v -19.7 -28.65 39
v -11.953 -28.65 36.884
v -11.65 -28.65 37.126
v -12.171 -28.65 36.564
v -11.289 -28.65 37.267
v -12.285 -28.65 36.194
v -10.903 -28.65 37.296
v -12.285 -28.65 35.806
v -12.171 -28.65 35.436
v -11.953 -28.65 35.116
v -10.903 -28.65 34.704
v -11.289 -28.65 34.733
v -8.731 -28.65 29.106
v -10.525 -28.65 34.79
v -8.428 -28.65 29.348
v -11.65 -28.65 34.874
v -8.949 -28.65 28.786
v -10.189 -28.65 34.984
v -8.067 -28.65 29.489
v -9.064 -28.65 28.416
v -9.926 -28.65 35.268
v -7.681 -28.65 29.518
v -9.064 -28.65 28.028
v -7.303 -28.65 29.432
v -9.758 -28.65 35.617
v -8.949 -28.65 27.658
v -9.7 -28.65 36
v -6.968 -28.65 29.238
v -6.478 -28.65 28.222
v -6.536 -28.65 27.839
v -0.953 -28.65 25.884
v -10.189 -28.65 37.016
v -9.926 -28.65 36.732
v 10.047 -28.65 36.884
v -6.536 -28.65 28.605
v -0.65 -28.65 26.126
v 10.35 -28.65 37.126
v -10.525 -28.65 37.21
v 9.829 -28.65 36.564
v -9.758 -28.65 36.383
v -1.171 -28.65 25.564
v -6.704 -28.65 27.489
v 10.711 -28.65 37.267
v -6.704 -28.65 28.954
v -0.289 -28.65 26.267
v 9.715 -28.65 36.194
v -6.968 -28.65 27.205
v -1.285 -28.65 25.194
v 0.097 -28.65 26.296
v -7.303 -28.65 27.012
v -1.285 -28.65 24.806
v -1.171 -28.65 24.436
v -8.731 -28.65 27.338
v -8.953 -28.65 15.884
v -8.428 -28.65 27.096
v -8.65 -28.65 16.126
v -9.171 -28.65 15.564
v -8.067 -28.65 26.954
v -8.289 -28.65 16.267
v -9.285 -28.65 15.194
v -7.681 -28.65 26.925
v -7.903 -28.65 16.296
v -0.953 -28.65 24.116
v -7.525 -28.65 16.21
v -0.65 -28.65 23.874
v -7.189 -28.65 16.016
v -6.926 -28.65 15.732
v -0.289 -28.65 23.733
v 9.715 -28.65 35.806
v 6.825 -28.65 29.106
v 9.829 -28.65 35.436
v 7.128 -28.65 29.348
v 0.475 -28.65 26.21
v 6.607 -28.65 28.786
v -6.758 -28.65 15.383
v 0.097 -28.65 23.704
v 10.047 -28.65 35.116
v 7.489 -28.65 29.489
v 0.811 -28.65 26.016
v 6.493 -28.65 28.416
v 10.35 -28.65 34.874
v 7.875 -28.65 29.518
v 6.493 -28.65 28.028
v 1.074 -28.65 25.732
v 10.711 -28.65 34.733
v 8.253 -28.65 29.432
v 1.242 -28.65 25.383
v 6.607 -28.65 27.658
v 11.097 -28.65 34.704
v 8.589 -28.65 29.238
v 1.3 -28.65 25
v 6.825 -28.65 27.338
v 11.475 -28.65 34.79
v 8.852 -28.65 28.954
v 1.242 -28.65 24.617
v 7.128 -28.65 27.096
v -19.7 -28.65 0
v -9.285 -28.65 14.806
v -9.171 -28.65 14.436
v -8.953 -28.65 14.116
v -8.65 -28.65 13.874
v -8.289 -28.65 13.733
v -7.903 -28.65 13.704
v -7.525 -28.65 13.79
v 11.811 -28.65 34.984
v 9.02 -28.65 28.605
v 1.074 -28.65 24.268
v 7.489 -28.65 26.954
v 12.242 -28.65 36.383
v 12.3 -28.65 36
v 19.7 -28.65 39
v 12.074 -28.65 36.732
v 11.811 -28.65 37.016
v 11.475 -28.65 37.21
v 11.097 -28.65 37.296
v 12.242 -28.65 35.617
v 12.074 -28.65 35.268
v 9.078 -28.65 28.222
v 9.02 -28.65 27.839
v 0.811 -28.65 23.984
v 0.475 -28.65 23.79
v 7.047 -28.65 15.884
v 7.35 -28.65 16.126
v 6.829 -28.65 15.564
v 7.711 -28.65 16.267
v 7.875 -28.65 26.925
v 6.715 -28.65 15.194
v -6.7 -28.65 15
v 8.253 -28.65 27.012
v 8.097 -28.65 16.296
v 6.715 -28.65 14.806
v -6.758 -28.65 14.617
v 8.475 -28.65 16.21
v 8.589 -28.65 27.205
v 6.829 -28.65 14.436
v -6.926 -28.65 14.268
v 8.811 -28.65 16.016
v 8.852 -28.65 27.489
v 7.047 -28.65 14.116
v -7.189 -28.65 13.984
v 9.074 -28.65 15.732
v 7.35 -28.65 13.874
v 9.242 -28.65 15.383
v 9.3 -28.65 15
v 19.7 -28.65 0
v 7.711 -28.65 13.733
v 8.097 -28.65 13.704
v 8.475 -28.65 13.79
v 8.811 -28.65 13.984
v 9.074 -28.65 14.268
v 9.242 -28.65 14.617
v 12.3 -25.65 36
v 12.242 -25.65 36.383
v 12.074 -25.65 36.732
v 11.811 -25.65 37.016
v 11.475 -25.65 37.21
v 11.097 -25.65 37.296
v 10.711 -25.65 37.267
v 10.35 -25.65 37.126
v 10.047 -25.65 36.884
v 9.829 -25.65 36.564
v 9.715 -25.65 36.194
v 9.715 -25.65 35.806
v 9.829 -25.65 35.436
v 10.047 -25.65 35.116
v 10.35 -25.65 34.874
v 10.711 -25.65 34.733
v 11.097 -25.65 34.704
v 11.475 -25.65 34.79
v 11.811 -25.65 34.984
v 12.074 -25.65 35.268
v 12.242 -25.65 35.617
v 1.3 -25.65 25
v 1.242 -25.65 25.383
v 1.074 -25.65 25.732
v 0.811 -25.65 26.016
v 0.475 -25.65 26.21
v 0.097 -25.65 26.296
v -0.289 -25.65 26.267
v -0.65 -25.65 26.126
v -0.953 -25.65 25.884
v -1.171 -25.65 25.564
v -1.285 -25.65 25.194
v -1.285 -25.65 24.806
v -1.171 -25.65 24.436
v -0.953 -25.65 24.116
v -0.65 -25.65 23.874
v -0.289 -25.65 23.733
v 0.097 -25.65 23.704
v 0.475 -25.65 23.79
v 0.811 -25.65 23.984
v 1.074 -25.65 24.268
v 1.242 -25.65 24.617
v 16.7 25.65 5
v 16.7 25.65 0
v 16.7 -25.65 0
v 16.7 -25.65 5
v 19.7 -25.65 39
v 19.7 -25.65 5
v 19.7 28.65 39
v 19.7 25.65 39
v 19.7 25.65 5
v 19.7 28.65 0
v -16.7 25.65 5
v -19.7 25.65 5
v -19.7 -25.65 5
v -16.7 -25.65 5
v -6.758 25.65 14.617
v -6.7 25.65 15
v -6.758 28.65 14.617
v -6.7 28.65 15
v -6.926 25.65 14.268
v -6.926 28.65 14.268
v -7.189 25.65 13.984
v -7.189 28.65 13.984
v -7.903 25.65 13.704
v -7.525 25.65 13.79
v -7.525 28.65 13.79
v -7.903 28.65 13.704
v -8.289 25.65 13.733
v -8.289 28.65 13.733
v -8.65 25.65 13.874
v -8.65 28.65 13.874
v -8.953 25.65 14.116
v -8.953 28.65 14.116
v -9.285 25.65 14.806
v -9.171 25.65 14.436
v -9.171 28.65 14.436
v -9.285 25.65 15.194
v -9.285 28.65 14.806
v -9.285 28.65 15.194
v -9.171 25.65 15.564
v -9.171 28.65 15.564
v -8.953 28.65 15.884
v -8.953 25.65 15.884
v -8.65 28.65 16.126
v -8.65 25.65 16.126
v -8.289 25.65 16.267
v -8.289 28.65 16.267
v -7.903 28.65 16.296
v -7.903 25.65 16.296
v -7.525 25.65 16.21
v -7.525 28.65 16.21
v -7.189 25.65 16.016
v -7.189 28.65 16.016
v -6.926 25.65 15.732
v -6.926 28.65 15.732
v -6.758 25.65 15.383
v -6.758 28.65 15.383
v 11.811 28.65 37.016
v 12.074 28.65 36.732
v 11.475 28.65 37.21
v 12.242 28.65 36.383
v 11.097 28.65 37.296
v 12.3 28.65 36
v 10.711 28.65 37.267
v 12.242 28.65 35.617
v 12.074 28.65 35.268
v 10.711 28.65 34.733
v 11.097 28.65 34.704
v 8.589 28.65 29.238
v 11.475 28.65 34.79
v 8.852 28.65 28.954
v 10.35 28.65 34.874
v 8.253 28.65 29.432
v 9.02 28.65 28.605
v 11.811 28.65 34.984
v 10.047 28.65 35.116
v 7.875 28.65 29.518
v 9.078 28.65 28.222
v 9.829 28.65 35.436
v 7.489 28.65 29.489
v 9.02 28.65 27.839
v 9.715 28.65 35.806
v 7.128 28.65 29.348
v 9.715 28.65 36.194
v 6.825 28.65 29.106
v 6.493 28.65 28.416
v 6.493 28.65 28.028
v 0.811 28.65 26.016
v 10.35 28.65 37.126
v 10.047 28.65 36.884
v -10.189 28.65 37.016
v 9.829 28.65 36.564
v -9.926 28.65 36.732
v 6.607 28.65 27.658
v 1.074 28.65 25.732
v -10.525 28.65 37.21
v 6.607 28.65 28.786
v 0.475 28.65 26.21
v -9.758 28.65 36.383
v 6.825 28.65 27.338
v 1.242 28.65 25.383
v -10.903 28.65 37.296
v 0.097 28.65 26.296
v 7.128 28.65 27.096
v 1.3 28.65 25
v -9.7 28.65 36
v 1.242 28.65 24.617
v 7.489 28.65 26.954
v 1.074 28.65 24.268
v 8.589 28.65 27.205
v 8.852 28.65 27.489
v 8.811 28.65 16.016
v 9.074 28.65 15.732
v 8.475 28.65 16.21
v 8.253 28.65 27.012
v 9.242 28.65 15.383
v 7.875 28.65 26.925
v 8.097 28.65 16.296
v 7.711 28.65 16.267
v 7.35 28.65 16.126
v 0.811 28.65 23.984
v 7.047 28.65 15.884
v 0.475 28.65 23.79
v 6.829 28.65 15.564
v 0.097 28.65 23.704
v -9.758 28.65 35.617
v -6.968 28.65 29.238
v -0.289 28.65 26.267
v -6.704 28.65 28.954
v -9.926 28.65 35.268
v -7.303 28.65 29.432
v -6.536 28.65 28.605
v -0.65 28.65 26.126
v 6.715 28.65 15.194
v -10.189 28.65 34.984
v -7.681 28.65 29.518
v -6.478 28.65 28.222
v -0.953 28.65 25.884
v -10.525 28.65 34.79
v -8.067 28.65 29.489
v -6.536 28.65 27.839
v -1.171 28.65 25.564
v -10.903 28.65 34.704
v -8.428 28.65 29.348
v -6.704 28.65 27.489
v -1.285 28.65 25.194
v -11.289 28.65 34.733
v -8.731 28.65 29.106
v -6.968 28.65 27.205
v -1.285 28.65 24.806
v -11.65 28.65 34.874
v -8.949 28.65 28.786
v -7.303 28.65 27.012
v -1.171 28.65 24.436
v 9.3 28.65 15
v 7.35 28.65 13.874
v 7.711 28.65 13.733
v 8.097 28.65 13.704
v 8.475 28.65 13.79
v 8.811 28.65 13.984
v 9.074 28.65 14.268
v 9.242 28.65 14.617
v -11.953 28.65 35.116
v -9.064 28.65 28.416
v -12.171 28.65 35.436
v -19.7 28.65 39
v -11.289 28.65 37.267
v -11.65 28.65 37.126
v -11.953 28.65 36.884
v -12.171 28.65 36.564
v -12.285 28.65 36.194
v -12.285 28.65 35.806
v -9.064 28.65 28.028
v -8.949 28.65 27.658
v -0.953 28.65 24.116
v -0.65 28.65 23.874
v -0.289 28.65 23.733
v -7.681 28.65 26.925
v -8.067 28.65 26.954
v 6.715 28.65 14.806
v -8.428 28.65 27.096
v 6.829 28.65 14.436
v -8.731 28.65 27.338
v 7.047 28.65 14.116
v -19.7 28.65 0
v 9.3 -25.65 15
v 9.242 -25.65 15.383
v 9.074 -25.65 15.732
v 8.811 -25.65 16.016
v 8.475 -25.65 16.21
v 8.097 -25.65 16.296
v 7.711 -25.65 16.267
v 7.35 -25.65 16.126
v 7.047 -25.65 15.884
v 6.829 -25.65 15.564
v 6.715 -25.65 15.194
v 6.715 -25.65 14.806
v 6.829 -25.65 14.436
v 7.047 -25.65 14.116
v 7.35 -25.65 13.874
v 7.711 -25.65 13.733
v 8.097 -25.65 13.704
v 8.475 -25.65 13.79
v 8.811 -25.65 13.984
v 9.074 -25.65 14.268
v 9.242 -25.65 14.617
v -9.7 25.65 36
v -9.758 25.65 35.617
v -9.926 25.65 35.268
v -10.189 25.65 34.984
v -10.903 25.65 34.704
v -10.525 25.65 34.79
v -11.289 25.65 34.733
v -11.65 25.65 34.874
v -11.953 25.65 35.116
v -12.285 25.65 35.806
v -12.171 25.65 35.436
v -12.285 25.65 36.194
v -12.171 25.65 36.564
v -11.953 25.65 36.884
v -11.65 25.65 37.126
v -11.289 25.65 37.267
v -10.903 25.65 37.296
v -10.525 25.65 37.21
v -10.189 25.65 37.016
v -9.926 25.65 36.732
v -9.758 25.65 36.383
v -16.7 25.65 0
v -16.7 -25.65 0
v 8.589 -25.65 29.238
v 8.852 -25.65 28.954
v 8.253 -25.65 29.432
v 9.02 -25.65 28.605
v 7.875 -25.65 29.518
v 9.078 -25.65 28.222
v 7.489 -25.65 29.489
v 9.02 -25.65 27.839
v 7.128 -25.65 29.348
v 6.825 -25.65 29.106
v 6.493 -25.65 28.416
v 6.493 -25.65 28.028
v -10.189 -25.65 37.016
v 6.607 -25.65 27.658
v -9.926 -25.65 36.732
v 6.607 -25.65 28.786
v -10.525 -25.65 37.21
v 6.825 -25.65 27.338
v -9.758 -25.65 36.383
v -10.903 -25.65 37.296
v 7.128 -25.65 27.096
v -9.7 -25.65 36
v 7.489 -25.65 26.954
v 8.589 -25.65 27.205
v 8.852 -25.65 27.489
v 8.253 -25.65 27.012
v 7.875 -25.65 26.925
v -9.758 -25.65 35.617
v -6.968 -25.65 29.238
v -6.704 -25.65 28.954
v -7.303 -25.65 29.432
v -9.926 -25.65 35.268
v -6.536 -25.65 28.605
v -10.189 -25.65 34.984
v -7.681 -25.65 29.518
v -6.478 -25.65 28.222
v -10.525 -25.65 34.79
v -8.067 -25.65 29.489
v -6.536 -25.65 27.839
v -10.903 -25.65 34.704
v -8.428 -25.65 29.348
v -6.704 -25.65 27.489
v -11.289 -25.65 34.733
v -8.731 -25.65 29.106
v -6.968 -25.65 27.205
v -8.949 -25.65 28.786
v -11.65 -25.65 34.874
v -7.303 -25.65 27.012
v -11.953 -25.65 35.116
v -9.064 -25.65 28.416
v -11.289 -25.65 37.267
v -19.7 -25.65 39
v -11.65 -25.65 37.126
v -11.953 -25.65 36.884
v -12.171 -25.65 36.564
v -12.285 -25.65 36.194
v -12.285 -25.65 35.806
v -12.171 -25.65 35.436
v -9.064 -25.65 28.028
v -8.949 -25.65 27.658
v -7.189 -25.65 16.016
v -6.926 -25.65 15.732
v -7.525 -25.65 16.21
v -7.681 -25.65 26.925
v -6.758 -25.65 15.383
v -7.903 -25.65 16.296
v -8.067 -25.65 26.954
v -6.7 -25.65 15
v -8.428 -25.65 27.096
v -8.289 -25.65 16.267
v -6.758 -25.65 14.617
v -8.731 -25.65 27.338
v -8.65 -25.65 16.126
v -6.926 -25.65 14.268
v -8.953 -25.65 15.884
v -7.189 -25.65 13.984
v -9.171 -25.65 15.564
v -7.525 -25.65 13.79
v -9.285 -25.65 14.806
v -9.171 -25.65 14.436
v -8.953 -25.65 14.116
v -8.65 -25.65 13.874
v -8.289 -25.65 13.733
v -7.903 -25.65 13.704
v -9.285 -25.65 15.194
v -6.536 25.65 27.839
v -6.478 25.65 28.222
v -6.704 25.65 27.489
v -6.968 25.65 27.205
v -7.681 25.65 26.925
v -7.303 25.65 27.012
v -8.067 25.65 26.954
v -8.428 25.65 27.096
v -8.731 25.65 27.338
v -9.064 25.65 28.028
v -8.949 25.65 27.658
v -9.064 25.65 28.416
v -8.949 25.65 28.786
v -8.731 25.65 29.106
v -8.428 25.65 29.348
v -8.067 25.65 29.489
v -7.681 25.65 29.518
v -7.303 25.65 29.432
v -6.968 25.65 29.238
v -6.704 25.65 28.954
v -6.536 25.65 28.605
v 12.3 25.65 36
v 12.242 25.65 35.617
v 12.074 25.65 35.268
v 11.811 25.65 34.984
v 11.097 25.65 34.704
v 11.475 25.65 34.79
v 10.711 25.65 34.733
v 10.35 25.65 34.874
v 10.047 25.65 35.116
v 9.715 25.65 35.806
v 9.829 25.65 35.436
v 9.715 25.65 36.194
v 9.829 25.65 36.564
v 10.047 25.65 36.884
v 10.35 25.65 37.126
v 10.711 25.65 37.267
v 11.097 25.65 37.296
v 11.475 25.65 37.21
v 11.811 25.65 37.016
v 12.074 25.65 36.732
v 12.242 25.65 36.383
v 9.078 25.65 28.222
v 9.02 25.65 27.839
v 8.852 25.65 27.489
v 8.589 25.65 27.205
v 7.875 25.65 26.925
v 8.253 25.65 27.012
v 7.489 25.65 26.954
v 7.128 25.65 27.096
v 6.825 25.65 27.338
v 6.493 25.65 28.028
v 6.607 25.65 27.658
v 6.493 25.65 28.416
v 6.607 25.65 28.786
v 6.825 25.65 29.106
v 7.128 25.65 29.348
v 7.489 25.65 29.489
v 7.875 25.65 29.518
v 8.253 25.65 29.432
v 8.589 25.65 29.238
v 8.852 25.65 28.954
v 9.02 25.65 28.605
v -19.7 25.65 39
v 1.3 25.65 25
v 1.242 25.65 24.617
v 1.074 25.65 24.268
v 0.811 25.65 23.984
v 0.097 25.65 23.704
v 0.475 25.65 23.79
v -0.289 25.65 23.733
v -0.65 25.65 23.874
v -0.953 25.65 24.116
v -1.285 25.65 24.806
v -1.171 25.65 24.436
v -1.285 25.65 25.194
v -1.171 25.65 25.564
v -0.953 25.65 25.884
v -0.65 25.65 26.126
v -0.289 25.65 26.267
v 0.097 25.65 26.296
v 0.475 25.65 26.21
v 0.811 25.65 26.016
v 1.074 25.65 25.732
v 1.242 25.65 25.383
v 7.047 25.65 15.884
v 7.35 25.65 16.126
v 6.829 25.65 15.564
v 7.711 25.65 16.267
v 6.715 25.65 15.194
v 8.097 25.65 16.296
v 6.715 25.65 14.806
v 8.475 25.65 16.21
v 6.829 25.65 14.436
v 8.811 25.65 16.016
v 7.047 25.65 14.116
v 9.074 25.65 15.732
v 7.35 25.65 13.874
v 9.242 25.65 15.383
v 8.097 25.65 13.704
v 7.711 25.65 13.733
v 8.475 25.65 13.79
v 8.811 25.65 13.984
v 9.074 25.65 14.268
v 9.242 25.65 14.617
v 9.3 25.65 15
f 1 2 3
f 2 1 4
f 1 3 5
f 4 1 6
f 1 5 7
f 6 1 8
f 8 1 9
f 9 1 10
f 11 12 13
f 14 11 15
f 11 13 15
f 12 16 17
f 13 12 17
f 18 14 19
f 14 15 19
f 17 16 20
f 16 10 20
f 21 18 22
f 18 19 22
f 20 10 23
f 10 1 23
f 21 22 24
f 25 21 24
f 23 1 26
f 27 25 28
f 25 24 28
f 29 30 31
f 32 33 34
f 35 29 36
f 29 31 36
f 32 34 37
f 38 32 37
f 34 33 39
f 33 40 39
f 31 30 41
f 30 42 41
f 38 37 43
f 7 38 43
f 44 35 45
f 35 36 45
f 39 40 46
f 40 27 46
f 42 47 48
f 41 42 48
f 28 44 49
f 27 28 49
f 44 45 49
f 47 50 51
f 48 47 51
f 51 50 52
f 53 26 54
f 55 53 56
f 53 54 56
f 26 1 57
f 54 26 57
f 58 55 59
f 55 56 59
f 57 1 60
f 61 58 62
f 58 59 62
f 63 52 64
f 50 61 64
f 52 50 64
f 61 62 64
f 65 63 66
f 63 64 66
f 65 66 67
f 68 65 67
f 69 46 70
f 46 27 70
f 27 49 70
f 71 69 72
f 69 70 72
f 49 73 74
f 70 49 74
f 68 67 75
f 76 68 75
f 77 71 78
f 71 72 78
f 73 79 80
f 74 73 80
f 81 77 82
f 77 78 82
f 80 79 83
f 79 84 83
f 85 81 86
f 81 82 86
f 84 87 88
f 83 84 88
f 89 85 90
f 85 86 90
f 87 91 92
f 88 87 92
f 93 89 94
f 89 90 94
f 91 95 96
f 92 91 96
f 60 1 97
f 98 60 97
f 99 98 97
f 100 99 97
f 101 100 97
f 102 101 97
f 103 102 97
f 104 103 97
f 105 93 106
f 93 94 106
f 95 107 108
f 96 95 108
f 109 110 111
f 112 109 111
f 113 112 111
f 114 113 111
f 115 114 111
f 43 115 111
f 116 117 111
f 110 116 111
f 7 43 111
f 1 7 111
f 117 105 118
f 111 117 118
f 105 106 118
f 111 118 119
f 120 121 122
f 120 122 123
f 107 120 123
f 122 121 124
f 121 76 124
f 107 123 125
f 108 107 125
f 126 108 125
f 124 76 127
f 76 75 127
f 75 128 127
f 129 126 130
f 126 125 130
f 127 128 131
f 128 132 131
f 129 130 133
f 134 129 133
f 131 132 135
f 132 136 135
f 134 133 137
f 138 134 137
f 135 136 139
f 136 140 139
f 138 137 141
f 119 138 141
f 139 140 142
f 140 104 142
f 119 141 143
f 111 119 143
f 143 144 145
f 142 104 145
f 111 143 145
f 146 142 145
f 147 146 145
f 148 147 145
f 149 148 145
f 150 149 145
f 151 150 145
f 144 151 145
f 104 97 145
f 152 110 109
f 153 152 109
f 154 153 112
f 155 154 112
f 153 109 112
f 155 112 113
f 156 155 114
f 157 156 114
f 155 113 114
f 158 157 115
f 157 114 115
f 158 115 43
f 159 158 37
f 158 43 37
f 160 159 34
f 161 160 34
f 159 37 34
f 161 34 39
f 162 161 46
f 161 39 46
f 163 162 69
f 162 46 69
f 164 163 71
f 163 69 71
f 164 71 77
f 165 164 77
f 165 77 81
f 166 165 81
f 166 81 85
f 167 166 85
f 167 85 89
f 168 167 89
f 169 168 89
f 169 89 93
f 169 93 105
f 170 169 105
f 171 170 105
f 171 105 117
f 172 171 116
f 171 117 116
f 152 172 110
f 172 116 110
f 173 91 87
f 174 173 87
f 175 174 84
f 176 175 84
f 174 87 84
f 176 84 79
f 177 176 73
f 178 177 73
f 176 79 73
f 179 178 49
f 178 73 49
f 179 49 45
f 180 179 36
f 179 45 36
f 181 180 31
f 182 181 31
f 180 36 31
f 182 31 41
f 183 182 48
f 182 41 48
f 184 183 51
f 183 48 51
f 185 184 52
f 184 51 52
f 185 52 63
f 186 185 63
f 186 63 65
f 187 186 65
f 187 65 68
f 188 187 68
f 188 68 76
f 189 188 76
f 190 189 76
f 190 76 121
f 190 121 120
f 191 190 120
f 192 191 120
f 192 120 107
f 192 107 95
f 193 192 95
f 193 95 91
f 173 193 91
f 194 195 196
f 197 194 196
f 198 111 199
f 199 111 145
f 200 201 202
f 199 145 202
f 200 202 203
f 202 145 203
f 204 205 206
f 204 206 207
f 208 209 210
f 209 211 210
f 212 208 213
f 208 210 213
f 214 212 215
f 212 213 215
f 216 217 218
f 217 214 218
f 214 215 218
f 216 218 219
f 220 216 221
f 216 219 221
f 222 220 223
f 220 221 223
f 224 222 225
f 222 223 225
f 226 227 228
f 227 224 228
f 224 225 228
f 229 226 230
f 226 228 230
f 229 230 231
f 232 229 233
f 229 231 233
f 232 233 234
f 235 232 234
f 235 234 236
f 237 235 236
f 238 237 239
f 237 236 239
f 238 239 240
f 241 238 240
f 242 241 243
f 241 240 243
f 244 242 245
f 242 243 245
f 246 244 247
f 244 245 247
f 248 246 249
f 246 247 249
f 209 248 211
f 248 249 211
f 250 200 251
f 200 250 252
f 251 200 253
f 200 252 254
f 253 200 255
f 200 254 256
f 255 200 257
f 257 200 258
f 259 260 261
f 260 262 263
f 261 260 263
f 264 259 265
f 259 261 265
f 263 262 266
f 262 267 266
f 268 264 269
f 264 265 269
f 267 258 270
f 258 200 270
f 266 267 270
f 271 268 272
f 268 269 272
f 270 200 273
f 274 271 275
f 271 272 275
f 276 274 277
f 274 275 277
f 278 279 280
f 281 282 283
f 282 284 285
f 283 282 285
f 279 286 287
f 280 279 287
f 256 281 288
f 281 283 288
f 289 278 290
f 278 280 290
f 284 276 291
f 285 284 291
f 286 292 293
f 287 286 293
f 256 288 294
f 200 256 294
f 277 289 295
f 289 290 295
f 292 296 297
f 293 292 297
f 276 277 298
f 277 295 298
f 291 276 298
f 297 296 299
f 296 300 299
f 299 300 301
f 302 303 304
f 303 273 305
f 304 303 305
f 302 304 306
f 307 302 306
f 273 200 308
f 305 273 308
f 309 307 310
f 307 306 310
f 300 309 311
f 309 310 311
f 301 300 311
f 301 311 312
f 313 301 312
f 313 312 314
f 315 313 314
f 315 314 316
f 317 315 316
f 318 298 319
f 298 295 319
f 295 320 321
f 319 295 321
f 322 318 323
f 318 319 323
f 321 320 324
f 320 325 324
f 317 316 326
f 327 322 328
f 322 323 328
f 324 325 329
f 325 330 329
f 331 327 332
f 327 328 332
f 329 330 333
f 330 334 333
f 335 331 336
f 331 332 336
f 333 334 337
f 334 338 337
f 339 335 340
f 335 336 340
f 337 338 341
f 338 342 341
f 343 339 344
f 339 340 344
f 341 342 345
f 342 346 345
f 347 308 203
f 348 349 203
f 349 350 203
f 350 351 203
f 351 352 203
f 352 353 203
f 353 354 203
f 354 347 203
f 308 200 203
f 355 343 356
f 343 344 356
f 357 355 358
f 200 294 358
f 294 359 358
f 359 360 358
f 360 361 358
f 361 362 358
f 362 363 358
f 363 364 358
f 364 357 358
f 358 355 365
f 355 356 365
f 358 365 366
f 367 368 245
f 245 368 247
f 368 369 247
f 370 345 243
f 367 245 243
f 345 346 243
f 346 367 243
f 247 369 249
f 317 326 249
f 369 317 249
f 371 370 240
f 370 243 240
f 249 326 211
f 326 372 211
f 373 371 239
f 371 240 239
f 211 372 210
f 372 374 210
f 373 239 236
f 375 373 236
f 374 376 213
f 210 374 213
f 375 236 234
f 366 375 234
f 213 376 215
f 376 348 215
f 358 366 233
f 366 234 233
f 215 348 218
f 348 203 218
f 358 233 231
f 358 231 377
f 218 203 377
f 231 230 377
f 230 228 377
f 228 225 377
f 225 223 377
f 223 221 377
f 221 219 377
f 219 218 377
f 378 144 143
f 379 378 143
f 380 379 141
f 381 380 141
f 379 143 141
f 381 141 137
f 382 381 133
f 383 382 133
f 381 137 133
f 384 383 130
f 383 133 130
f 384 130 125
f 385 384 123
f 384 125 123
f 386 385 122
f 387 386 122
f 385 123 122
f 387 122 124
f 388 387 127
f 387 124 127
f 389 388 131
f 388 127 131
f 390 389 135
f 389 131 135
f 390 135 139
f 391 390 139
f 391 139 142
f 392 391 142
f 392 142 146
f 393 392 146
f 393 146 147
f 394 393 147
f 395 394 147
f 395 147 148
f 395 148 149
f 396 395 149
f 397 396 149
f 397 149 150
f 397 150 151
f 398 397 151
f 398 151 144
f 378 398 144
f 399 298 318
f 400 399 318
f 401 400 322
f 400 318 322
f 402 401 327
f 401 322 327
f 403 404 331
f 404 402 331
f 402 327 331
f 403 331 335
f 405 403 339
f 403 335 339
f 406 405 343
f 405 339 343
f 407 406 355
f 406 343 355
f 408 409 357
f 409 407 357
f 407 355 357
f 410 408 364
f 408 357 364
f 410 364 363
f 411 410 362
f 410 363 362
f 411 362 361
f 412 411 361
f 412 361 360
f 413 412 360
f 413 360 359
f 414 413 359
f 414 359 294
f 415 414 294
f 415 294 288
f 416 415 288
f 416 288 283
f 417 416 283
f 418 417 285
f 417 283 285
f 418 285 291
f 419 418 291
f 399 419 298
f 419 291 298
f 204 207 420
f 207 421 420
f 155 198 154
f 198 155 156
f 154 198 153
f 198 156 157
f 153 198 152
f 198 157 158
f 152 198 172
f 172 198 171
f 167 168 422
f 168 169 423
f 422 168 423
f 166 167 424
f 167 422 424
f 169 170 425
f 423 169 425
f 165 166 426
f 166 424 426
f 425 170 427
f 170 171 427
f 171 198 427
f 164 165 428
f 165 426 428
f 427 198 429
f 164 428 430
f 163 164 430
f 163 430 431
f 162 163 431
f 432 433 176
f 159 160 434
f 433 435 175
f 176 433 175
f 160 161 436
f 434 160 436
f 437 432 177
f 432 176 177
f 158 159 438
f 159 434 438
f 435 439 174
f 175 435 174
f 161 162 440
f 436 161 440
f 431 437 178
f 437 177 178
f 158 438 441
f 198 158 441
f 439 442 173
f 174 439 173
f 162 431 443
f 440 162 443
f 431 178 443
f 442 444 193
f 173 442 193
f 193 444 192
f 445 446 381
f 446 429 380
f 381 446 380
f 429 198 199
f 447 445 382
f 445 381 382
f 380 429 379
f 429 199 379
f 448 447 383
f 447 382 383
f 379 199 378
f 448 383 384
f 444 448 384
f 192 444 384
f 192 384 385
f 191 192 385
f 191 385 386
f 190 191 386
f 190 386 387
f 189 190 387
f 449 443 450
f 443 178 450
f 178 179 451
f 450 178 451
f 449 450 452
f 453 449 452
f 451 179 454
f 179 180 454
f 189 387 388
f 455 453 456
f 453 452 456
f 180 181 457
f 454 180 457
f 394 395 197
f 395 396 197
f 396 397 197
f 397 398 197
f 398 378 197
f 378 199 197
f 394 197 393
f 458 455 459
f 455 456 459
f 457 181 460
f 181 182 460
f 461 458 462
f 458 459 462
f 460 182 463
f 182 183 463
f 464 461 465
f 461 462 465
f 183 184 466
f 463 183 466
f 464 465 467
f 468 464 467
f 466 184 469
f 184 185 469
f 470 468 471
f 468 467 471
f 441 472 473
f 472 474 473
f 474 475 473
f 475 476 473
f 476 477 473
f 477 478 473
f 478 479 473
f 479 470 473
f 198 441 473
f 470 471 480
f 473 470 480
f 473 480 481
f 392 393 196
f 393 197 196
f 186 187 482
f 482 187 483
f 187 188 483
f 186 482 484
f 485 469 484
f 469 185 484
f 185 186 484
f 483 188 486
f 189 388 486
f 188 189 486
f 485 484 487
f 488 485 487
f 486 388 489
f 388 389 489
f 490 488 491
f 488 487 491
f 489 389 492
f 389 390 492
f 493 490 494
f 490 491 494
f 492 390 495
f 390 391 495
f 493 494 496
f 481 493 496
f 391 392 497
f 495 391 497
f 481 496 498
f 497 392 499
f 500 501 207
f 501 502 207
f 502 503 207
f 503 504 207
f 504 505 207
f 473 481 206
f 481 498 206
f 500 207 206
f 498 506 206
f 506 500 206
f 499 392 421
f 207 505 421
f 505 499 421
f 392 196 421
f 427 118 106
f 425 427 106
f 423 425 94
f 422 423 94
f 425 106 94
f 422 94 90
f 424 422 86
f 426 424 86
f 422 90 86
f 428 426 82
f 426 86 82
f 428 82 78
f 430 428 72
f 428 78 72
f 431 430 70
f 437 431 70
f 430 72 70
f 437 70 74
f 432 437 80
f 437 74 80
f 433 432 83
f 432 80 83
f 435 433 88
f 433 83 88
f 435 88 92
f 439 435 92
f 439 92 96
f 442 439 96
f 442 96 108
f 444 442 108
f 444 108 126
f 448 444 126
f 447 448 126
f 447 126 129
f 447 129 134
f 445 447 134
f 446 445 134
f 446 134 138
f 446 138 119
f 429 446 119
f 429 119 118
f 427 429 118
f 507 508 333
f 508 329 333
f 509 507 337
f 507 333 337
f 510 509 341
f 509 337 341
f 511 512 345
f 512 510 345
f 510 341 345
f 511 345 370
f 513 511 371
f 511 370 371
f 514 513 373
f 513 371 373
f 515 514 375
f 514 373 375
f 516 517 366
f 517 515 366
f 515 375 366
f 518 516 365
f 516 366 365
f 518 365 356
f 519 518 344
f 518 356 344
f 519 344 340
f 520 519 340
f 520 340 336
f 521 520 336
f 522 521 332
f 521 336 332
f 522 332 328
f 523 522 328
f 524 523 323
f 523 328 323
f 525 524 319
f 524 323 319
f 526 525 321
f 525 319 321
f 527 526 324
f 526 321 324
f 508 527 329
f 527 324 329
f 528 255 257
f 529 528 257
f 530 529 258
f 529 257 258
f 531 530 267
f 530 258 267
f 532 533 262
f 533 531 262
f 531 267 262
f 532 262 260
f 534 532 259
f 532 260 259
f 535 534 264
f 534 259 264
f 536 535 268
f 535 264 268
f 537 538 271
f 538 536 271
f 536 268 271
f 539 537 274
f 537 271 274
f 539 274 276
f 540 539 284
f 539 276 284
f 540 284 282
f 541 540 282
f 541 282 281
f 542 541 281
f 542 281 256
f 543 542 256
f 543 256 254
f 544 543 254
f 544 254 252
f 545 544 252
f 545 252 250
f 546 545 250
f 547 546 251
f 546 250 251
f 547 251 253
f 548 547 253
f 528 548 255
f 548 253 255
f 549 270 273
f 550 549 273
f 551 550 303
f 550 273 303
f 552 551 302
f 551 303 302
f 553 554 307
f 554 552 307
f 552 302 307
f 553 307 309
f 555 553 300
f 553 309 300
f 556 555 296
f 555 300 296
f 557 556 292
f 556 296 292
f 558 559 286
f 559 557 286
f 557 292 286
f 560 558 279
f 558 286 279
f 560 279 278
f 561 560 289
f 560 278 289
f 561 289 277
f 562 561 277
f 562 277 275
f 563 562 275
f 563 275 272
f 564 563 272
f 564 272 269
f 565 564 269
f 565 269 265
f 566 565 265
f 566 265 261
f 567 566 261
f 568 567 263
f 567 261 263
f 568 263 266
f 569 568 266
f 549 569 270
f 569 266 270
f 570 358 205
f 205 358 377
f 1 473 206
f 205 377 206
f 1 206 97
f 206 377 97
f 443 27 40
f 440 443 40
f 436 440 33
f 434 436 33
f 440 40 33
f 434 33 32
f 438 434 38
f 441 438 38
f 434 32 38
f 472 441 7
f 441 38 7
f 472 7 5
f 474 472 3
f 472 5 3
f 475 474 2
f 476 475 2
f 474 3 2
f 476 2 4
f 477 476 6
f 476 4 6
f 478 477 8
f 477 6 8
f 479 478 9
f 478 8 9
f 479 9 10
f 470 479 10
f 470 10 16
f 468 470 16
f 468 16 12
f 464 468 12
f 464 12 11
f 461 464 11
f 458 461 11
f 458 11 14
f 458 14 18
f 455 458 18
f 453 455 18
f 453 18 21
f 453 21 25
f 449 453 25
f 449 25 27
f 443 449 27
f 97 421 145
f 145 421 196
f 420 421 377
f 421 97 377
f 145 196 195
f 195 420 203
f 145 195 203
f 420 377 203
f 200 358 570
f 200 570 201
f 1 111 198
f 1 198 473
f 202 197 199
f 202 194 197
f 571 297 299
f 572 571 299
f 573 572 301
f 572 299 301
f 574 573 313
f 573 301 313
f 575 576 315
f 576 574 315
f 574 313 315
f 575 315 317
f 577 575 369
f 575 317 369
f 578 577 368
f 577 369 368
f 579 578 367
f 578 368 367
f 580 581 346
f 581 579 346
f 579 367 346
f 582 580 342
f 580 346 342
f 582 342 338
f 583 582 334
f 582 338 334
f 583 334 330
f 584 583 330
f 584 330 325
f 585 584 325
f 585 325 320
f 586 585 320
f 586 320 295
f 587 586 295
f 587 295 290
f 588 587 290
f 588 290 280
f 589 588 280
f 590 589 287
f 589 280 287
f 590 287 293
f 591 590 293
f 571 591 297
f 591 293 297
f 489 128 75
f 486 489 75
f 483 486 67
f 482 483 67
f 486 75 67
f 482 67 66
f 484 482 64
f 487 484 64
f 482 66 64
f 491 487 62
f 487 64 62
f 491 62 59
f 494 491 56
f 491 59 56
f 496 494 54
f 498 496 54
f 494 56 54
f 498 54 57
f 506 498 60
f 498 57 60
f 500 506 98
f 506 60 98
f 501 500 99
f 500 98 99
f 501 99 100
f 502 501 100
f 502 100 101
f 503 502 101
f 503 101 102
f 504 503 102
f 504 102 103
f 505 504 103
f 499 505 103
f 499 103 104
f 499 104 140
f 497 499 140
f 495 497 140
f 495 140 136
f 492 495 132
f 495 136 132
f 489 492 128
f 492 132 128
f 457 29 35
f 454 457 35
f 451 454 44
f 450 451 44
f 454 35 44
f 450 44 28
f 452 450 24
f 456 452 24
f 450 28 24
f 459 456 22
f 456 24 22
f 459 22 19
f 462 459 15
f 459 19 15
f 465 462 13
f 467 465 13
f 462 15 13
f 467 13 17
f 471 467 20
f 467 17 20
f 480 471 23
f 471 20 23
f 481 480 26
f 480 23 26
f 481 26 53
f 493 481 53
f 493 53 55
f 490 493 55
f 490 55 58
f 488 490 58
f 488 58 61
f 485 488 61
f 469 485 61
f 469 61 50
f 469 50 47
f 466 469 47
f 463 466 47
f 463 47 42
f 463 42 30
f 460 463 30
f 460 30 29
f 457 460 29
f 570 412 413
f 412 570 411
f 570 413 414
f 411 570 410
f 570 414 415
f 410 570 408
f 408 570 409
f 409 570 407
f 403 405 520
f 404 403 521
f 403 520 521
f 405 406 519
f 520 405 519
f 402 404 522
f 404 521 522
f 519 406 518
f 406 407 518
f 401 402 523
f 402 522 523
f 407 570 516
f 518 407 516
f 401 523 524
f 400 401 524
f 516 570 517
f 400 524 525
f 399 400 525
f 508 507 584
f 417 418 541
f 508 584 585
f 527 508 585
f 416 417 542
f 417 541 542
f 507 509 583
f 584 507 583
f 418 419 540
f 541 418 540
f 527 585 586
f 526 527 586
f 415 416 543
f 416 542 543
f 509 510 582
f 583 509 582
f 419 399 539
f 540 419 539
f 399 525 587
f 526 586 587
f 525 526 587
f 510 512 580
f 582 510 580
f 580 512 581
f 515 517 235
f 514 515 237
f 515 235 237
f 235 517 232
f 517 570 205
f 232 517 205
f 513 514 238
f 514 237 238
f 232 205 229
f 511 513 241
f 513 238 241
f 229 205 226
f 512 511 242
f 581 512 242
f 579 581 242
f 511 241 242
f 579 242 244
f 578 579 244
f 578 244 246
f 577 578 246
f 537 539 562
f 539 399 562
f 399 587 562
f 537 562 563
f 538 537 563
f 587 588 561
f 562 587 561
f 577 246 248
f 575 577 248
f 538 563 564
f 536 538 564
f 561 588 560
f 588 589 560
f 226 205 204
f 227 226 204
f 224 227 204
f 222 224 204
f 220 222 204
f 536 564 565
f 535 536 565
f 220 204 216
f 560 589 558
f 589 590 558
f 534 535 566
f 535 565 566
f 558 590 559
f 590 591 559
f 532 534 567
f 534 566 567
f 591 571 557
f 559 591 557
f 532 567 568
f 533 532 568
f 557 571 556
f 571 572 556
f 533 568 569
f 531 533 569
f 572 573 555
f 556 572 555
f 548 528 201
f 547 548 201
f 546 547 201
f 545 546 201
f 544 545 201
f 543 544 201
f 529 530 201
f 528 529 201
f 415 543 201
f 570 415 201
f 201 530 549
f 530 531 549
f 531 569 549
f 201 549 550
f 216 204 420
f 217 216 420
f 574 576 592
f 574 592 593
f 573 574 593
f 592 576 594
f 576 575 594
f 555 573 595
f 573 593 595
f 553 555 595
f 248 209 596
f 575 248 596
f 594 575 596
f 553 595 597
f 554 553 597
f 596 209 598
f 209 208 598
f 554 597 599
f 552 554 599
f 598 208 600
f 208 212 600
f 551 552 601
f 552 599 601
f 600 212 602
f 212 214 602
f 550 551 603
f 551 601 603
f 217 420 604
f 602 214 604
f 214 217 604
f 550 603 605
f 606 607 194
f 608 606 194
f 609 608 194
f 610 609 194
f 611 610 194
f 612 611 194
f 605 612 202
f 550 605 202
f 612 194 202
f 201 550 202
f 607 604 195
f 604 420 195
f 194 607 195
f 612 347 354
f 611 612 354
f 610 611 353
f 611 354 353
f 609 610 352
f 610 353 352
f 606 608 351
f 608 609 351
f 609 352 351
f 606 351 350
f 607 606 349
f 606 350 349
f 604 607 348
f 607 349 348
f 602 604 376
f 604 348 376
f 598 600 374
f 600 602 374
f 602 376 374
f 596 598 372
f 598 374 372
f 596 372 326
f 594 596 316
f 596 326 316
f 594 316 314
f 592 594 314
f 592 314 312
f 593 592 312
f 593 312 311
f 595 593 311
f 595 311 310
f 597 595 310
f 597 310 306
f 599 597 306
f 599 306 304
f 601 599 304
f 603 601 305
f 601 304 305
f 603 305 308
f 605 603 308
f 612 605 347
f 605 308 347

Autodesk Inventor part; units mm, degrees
ref_plane "YZ Plane" through (0, 0, 0) normal (1, 0, 0) x (0, 1, 0)
ref_plane "XZ Plane" through (0, 0, 0) normal (0, 1, 0) x (-1, 0, 0)
ref_plane "XY Plane" through (0, 0, 0) normal (0, 0, 1) x (1, 0, 0)
sketch "스케치1" plane through (0, 0, 0) normal (0, 0, 1) x (1, 0, 0)
  line L0 (-16.7, 25.65) -> (16.7, 25.65)
  line L1 (16.7, 25.65) -> (16.7, -25.65)
  line L2 (16.7, -25.65) -> (-16.7, -25.65)
  line L3 (-16.7, -25.65) -> (-16.7, 25.65)
  line L4 (19.7, 28.65) -> (-19.7, 28.65)
  line L5 (-19.7, 28.65) -> (-19.7, -28.65)
  line L6 (-19.7, -28.65) -> (19.7, -28.65)
  line L7 (19.7, -28.65) -> (19.7, 28.65)
  point P0 (0, 0)
  point P1 (-16.7, 0)
  point P2 (0, 25.65)
  dimension "d0" = 33.4
  dimension "d1" = 51.3
  dimension "d2" = 3
extrude "돌출1" add sketch "스케치1" along normal blind 5
sketch "스케치5" plane through (-19.7, -28.65, 0) normal (0, -1, 0) x (1, 0, 0)
  line L0 (0, 0) -> (39.4, 0) projected
  line L1 (39.4, 0) -> (39.4, 5) projected
  line L2 (0, 5) -> (39.4, 5) projected
  line L3 (0, 0) -> (0, 5) projected
  circle A0 centre (8.7, 36) radius 1.3
  circle A1 centre (11.9218, 28.2218) radius 1.3
  circle A2 centre (19.7, 25) radius 1.3
  circle A3 centre (27.4782, 28.2218) radius 1.3
  circle A4 centre (30.7, 36) radius 1.3
  line L4 (0, 0) -> (39.4, 0)
  line L5 (39.4, 0) -> (39.4, 39)
  line L6 (39.4, 39) -> (0, 39)
  line L7 (0, 39) -> (0, 0)
  line L8 (0, 15) -> (39.4, 15) construction
  line L9 (19.7, 39) -> (19.7, 5) construction
  circle A5 centre (11.7, 15) radius 1.3
  circle A6 centre (27.7, 15) radius 1.3
  point P0 (19.7, 36)
  dimension "d46" = 180
  dimension "d52" = 39
  dimension "d53" = 24
  dimension "d54" = 2.6
  dimension "d55" = 8
extrude "돌출2" add sketch "스케치5" against normal blind 3 contours L7 L6 L5 L2
mirror "미러1" about plane through (0, 0, 0) normal (0, 1, 0)
properties part number "MX64 FRAME"
